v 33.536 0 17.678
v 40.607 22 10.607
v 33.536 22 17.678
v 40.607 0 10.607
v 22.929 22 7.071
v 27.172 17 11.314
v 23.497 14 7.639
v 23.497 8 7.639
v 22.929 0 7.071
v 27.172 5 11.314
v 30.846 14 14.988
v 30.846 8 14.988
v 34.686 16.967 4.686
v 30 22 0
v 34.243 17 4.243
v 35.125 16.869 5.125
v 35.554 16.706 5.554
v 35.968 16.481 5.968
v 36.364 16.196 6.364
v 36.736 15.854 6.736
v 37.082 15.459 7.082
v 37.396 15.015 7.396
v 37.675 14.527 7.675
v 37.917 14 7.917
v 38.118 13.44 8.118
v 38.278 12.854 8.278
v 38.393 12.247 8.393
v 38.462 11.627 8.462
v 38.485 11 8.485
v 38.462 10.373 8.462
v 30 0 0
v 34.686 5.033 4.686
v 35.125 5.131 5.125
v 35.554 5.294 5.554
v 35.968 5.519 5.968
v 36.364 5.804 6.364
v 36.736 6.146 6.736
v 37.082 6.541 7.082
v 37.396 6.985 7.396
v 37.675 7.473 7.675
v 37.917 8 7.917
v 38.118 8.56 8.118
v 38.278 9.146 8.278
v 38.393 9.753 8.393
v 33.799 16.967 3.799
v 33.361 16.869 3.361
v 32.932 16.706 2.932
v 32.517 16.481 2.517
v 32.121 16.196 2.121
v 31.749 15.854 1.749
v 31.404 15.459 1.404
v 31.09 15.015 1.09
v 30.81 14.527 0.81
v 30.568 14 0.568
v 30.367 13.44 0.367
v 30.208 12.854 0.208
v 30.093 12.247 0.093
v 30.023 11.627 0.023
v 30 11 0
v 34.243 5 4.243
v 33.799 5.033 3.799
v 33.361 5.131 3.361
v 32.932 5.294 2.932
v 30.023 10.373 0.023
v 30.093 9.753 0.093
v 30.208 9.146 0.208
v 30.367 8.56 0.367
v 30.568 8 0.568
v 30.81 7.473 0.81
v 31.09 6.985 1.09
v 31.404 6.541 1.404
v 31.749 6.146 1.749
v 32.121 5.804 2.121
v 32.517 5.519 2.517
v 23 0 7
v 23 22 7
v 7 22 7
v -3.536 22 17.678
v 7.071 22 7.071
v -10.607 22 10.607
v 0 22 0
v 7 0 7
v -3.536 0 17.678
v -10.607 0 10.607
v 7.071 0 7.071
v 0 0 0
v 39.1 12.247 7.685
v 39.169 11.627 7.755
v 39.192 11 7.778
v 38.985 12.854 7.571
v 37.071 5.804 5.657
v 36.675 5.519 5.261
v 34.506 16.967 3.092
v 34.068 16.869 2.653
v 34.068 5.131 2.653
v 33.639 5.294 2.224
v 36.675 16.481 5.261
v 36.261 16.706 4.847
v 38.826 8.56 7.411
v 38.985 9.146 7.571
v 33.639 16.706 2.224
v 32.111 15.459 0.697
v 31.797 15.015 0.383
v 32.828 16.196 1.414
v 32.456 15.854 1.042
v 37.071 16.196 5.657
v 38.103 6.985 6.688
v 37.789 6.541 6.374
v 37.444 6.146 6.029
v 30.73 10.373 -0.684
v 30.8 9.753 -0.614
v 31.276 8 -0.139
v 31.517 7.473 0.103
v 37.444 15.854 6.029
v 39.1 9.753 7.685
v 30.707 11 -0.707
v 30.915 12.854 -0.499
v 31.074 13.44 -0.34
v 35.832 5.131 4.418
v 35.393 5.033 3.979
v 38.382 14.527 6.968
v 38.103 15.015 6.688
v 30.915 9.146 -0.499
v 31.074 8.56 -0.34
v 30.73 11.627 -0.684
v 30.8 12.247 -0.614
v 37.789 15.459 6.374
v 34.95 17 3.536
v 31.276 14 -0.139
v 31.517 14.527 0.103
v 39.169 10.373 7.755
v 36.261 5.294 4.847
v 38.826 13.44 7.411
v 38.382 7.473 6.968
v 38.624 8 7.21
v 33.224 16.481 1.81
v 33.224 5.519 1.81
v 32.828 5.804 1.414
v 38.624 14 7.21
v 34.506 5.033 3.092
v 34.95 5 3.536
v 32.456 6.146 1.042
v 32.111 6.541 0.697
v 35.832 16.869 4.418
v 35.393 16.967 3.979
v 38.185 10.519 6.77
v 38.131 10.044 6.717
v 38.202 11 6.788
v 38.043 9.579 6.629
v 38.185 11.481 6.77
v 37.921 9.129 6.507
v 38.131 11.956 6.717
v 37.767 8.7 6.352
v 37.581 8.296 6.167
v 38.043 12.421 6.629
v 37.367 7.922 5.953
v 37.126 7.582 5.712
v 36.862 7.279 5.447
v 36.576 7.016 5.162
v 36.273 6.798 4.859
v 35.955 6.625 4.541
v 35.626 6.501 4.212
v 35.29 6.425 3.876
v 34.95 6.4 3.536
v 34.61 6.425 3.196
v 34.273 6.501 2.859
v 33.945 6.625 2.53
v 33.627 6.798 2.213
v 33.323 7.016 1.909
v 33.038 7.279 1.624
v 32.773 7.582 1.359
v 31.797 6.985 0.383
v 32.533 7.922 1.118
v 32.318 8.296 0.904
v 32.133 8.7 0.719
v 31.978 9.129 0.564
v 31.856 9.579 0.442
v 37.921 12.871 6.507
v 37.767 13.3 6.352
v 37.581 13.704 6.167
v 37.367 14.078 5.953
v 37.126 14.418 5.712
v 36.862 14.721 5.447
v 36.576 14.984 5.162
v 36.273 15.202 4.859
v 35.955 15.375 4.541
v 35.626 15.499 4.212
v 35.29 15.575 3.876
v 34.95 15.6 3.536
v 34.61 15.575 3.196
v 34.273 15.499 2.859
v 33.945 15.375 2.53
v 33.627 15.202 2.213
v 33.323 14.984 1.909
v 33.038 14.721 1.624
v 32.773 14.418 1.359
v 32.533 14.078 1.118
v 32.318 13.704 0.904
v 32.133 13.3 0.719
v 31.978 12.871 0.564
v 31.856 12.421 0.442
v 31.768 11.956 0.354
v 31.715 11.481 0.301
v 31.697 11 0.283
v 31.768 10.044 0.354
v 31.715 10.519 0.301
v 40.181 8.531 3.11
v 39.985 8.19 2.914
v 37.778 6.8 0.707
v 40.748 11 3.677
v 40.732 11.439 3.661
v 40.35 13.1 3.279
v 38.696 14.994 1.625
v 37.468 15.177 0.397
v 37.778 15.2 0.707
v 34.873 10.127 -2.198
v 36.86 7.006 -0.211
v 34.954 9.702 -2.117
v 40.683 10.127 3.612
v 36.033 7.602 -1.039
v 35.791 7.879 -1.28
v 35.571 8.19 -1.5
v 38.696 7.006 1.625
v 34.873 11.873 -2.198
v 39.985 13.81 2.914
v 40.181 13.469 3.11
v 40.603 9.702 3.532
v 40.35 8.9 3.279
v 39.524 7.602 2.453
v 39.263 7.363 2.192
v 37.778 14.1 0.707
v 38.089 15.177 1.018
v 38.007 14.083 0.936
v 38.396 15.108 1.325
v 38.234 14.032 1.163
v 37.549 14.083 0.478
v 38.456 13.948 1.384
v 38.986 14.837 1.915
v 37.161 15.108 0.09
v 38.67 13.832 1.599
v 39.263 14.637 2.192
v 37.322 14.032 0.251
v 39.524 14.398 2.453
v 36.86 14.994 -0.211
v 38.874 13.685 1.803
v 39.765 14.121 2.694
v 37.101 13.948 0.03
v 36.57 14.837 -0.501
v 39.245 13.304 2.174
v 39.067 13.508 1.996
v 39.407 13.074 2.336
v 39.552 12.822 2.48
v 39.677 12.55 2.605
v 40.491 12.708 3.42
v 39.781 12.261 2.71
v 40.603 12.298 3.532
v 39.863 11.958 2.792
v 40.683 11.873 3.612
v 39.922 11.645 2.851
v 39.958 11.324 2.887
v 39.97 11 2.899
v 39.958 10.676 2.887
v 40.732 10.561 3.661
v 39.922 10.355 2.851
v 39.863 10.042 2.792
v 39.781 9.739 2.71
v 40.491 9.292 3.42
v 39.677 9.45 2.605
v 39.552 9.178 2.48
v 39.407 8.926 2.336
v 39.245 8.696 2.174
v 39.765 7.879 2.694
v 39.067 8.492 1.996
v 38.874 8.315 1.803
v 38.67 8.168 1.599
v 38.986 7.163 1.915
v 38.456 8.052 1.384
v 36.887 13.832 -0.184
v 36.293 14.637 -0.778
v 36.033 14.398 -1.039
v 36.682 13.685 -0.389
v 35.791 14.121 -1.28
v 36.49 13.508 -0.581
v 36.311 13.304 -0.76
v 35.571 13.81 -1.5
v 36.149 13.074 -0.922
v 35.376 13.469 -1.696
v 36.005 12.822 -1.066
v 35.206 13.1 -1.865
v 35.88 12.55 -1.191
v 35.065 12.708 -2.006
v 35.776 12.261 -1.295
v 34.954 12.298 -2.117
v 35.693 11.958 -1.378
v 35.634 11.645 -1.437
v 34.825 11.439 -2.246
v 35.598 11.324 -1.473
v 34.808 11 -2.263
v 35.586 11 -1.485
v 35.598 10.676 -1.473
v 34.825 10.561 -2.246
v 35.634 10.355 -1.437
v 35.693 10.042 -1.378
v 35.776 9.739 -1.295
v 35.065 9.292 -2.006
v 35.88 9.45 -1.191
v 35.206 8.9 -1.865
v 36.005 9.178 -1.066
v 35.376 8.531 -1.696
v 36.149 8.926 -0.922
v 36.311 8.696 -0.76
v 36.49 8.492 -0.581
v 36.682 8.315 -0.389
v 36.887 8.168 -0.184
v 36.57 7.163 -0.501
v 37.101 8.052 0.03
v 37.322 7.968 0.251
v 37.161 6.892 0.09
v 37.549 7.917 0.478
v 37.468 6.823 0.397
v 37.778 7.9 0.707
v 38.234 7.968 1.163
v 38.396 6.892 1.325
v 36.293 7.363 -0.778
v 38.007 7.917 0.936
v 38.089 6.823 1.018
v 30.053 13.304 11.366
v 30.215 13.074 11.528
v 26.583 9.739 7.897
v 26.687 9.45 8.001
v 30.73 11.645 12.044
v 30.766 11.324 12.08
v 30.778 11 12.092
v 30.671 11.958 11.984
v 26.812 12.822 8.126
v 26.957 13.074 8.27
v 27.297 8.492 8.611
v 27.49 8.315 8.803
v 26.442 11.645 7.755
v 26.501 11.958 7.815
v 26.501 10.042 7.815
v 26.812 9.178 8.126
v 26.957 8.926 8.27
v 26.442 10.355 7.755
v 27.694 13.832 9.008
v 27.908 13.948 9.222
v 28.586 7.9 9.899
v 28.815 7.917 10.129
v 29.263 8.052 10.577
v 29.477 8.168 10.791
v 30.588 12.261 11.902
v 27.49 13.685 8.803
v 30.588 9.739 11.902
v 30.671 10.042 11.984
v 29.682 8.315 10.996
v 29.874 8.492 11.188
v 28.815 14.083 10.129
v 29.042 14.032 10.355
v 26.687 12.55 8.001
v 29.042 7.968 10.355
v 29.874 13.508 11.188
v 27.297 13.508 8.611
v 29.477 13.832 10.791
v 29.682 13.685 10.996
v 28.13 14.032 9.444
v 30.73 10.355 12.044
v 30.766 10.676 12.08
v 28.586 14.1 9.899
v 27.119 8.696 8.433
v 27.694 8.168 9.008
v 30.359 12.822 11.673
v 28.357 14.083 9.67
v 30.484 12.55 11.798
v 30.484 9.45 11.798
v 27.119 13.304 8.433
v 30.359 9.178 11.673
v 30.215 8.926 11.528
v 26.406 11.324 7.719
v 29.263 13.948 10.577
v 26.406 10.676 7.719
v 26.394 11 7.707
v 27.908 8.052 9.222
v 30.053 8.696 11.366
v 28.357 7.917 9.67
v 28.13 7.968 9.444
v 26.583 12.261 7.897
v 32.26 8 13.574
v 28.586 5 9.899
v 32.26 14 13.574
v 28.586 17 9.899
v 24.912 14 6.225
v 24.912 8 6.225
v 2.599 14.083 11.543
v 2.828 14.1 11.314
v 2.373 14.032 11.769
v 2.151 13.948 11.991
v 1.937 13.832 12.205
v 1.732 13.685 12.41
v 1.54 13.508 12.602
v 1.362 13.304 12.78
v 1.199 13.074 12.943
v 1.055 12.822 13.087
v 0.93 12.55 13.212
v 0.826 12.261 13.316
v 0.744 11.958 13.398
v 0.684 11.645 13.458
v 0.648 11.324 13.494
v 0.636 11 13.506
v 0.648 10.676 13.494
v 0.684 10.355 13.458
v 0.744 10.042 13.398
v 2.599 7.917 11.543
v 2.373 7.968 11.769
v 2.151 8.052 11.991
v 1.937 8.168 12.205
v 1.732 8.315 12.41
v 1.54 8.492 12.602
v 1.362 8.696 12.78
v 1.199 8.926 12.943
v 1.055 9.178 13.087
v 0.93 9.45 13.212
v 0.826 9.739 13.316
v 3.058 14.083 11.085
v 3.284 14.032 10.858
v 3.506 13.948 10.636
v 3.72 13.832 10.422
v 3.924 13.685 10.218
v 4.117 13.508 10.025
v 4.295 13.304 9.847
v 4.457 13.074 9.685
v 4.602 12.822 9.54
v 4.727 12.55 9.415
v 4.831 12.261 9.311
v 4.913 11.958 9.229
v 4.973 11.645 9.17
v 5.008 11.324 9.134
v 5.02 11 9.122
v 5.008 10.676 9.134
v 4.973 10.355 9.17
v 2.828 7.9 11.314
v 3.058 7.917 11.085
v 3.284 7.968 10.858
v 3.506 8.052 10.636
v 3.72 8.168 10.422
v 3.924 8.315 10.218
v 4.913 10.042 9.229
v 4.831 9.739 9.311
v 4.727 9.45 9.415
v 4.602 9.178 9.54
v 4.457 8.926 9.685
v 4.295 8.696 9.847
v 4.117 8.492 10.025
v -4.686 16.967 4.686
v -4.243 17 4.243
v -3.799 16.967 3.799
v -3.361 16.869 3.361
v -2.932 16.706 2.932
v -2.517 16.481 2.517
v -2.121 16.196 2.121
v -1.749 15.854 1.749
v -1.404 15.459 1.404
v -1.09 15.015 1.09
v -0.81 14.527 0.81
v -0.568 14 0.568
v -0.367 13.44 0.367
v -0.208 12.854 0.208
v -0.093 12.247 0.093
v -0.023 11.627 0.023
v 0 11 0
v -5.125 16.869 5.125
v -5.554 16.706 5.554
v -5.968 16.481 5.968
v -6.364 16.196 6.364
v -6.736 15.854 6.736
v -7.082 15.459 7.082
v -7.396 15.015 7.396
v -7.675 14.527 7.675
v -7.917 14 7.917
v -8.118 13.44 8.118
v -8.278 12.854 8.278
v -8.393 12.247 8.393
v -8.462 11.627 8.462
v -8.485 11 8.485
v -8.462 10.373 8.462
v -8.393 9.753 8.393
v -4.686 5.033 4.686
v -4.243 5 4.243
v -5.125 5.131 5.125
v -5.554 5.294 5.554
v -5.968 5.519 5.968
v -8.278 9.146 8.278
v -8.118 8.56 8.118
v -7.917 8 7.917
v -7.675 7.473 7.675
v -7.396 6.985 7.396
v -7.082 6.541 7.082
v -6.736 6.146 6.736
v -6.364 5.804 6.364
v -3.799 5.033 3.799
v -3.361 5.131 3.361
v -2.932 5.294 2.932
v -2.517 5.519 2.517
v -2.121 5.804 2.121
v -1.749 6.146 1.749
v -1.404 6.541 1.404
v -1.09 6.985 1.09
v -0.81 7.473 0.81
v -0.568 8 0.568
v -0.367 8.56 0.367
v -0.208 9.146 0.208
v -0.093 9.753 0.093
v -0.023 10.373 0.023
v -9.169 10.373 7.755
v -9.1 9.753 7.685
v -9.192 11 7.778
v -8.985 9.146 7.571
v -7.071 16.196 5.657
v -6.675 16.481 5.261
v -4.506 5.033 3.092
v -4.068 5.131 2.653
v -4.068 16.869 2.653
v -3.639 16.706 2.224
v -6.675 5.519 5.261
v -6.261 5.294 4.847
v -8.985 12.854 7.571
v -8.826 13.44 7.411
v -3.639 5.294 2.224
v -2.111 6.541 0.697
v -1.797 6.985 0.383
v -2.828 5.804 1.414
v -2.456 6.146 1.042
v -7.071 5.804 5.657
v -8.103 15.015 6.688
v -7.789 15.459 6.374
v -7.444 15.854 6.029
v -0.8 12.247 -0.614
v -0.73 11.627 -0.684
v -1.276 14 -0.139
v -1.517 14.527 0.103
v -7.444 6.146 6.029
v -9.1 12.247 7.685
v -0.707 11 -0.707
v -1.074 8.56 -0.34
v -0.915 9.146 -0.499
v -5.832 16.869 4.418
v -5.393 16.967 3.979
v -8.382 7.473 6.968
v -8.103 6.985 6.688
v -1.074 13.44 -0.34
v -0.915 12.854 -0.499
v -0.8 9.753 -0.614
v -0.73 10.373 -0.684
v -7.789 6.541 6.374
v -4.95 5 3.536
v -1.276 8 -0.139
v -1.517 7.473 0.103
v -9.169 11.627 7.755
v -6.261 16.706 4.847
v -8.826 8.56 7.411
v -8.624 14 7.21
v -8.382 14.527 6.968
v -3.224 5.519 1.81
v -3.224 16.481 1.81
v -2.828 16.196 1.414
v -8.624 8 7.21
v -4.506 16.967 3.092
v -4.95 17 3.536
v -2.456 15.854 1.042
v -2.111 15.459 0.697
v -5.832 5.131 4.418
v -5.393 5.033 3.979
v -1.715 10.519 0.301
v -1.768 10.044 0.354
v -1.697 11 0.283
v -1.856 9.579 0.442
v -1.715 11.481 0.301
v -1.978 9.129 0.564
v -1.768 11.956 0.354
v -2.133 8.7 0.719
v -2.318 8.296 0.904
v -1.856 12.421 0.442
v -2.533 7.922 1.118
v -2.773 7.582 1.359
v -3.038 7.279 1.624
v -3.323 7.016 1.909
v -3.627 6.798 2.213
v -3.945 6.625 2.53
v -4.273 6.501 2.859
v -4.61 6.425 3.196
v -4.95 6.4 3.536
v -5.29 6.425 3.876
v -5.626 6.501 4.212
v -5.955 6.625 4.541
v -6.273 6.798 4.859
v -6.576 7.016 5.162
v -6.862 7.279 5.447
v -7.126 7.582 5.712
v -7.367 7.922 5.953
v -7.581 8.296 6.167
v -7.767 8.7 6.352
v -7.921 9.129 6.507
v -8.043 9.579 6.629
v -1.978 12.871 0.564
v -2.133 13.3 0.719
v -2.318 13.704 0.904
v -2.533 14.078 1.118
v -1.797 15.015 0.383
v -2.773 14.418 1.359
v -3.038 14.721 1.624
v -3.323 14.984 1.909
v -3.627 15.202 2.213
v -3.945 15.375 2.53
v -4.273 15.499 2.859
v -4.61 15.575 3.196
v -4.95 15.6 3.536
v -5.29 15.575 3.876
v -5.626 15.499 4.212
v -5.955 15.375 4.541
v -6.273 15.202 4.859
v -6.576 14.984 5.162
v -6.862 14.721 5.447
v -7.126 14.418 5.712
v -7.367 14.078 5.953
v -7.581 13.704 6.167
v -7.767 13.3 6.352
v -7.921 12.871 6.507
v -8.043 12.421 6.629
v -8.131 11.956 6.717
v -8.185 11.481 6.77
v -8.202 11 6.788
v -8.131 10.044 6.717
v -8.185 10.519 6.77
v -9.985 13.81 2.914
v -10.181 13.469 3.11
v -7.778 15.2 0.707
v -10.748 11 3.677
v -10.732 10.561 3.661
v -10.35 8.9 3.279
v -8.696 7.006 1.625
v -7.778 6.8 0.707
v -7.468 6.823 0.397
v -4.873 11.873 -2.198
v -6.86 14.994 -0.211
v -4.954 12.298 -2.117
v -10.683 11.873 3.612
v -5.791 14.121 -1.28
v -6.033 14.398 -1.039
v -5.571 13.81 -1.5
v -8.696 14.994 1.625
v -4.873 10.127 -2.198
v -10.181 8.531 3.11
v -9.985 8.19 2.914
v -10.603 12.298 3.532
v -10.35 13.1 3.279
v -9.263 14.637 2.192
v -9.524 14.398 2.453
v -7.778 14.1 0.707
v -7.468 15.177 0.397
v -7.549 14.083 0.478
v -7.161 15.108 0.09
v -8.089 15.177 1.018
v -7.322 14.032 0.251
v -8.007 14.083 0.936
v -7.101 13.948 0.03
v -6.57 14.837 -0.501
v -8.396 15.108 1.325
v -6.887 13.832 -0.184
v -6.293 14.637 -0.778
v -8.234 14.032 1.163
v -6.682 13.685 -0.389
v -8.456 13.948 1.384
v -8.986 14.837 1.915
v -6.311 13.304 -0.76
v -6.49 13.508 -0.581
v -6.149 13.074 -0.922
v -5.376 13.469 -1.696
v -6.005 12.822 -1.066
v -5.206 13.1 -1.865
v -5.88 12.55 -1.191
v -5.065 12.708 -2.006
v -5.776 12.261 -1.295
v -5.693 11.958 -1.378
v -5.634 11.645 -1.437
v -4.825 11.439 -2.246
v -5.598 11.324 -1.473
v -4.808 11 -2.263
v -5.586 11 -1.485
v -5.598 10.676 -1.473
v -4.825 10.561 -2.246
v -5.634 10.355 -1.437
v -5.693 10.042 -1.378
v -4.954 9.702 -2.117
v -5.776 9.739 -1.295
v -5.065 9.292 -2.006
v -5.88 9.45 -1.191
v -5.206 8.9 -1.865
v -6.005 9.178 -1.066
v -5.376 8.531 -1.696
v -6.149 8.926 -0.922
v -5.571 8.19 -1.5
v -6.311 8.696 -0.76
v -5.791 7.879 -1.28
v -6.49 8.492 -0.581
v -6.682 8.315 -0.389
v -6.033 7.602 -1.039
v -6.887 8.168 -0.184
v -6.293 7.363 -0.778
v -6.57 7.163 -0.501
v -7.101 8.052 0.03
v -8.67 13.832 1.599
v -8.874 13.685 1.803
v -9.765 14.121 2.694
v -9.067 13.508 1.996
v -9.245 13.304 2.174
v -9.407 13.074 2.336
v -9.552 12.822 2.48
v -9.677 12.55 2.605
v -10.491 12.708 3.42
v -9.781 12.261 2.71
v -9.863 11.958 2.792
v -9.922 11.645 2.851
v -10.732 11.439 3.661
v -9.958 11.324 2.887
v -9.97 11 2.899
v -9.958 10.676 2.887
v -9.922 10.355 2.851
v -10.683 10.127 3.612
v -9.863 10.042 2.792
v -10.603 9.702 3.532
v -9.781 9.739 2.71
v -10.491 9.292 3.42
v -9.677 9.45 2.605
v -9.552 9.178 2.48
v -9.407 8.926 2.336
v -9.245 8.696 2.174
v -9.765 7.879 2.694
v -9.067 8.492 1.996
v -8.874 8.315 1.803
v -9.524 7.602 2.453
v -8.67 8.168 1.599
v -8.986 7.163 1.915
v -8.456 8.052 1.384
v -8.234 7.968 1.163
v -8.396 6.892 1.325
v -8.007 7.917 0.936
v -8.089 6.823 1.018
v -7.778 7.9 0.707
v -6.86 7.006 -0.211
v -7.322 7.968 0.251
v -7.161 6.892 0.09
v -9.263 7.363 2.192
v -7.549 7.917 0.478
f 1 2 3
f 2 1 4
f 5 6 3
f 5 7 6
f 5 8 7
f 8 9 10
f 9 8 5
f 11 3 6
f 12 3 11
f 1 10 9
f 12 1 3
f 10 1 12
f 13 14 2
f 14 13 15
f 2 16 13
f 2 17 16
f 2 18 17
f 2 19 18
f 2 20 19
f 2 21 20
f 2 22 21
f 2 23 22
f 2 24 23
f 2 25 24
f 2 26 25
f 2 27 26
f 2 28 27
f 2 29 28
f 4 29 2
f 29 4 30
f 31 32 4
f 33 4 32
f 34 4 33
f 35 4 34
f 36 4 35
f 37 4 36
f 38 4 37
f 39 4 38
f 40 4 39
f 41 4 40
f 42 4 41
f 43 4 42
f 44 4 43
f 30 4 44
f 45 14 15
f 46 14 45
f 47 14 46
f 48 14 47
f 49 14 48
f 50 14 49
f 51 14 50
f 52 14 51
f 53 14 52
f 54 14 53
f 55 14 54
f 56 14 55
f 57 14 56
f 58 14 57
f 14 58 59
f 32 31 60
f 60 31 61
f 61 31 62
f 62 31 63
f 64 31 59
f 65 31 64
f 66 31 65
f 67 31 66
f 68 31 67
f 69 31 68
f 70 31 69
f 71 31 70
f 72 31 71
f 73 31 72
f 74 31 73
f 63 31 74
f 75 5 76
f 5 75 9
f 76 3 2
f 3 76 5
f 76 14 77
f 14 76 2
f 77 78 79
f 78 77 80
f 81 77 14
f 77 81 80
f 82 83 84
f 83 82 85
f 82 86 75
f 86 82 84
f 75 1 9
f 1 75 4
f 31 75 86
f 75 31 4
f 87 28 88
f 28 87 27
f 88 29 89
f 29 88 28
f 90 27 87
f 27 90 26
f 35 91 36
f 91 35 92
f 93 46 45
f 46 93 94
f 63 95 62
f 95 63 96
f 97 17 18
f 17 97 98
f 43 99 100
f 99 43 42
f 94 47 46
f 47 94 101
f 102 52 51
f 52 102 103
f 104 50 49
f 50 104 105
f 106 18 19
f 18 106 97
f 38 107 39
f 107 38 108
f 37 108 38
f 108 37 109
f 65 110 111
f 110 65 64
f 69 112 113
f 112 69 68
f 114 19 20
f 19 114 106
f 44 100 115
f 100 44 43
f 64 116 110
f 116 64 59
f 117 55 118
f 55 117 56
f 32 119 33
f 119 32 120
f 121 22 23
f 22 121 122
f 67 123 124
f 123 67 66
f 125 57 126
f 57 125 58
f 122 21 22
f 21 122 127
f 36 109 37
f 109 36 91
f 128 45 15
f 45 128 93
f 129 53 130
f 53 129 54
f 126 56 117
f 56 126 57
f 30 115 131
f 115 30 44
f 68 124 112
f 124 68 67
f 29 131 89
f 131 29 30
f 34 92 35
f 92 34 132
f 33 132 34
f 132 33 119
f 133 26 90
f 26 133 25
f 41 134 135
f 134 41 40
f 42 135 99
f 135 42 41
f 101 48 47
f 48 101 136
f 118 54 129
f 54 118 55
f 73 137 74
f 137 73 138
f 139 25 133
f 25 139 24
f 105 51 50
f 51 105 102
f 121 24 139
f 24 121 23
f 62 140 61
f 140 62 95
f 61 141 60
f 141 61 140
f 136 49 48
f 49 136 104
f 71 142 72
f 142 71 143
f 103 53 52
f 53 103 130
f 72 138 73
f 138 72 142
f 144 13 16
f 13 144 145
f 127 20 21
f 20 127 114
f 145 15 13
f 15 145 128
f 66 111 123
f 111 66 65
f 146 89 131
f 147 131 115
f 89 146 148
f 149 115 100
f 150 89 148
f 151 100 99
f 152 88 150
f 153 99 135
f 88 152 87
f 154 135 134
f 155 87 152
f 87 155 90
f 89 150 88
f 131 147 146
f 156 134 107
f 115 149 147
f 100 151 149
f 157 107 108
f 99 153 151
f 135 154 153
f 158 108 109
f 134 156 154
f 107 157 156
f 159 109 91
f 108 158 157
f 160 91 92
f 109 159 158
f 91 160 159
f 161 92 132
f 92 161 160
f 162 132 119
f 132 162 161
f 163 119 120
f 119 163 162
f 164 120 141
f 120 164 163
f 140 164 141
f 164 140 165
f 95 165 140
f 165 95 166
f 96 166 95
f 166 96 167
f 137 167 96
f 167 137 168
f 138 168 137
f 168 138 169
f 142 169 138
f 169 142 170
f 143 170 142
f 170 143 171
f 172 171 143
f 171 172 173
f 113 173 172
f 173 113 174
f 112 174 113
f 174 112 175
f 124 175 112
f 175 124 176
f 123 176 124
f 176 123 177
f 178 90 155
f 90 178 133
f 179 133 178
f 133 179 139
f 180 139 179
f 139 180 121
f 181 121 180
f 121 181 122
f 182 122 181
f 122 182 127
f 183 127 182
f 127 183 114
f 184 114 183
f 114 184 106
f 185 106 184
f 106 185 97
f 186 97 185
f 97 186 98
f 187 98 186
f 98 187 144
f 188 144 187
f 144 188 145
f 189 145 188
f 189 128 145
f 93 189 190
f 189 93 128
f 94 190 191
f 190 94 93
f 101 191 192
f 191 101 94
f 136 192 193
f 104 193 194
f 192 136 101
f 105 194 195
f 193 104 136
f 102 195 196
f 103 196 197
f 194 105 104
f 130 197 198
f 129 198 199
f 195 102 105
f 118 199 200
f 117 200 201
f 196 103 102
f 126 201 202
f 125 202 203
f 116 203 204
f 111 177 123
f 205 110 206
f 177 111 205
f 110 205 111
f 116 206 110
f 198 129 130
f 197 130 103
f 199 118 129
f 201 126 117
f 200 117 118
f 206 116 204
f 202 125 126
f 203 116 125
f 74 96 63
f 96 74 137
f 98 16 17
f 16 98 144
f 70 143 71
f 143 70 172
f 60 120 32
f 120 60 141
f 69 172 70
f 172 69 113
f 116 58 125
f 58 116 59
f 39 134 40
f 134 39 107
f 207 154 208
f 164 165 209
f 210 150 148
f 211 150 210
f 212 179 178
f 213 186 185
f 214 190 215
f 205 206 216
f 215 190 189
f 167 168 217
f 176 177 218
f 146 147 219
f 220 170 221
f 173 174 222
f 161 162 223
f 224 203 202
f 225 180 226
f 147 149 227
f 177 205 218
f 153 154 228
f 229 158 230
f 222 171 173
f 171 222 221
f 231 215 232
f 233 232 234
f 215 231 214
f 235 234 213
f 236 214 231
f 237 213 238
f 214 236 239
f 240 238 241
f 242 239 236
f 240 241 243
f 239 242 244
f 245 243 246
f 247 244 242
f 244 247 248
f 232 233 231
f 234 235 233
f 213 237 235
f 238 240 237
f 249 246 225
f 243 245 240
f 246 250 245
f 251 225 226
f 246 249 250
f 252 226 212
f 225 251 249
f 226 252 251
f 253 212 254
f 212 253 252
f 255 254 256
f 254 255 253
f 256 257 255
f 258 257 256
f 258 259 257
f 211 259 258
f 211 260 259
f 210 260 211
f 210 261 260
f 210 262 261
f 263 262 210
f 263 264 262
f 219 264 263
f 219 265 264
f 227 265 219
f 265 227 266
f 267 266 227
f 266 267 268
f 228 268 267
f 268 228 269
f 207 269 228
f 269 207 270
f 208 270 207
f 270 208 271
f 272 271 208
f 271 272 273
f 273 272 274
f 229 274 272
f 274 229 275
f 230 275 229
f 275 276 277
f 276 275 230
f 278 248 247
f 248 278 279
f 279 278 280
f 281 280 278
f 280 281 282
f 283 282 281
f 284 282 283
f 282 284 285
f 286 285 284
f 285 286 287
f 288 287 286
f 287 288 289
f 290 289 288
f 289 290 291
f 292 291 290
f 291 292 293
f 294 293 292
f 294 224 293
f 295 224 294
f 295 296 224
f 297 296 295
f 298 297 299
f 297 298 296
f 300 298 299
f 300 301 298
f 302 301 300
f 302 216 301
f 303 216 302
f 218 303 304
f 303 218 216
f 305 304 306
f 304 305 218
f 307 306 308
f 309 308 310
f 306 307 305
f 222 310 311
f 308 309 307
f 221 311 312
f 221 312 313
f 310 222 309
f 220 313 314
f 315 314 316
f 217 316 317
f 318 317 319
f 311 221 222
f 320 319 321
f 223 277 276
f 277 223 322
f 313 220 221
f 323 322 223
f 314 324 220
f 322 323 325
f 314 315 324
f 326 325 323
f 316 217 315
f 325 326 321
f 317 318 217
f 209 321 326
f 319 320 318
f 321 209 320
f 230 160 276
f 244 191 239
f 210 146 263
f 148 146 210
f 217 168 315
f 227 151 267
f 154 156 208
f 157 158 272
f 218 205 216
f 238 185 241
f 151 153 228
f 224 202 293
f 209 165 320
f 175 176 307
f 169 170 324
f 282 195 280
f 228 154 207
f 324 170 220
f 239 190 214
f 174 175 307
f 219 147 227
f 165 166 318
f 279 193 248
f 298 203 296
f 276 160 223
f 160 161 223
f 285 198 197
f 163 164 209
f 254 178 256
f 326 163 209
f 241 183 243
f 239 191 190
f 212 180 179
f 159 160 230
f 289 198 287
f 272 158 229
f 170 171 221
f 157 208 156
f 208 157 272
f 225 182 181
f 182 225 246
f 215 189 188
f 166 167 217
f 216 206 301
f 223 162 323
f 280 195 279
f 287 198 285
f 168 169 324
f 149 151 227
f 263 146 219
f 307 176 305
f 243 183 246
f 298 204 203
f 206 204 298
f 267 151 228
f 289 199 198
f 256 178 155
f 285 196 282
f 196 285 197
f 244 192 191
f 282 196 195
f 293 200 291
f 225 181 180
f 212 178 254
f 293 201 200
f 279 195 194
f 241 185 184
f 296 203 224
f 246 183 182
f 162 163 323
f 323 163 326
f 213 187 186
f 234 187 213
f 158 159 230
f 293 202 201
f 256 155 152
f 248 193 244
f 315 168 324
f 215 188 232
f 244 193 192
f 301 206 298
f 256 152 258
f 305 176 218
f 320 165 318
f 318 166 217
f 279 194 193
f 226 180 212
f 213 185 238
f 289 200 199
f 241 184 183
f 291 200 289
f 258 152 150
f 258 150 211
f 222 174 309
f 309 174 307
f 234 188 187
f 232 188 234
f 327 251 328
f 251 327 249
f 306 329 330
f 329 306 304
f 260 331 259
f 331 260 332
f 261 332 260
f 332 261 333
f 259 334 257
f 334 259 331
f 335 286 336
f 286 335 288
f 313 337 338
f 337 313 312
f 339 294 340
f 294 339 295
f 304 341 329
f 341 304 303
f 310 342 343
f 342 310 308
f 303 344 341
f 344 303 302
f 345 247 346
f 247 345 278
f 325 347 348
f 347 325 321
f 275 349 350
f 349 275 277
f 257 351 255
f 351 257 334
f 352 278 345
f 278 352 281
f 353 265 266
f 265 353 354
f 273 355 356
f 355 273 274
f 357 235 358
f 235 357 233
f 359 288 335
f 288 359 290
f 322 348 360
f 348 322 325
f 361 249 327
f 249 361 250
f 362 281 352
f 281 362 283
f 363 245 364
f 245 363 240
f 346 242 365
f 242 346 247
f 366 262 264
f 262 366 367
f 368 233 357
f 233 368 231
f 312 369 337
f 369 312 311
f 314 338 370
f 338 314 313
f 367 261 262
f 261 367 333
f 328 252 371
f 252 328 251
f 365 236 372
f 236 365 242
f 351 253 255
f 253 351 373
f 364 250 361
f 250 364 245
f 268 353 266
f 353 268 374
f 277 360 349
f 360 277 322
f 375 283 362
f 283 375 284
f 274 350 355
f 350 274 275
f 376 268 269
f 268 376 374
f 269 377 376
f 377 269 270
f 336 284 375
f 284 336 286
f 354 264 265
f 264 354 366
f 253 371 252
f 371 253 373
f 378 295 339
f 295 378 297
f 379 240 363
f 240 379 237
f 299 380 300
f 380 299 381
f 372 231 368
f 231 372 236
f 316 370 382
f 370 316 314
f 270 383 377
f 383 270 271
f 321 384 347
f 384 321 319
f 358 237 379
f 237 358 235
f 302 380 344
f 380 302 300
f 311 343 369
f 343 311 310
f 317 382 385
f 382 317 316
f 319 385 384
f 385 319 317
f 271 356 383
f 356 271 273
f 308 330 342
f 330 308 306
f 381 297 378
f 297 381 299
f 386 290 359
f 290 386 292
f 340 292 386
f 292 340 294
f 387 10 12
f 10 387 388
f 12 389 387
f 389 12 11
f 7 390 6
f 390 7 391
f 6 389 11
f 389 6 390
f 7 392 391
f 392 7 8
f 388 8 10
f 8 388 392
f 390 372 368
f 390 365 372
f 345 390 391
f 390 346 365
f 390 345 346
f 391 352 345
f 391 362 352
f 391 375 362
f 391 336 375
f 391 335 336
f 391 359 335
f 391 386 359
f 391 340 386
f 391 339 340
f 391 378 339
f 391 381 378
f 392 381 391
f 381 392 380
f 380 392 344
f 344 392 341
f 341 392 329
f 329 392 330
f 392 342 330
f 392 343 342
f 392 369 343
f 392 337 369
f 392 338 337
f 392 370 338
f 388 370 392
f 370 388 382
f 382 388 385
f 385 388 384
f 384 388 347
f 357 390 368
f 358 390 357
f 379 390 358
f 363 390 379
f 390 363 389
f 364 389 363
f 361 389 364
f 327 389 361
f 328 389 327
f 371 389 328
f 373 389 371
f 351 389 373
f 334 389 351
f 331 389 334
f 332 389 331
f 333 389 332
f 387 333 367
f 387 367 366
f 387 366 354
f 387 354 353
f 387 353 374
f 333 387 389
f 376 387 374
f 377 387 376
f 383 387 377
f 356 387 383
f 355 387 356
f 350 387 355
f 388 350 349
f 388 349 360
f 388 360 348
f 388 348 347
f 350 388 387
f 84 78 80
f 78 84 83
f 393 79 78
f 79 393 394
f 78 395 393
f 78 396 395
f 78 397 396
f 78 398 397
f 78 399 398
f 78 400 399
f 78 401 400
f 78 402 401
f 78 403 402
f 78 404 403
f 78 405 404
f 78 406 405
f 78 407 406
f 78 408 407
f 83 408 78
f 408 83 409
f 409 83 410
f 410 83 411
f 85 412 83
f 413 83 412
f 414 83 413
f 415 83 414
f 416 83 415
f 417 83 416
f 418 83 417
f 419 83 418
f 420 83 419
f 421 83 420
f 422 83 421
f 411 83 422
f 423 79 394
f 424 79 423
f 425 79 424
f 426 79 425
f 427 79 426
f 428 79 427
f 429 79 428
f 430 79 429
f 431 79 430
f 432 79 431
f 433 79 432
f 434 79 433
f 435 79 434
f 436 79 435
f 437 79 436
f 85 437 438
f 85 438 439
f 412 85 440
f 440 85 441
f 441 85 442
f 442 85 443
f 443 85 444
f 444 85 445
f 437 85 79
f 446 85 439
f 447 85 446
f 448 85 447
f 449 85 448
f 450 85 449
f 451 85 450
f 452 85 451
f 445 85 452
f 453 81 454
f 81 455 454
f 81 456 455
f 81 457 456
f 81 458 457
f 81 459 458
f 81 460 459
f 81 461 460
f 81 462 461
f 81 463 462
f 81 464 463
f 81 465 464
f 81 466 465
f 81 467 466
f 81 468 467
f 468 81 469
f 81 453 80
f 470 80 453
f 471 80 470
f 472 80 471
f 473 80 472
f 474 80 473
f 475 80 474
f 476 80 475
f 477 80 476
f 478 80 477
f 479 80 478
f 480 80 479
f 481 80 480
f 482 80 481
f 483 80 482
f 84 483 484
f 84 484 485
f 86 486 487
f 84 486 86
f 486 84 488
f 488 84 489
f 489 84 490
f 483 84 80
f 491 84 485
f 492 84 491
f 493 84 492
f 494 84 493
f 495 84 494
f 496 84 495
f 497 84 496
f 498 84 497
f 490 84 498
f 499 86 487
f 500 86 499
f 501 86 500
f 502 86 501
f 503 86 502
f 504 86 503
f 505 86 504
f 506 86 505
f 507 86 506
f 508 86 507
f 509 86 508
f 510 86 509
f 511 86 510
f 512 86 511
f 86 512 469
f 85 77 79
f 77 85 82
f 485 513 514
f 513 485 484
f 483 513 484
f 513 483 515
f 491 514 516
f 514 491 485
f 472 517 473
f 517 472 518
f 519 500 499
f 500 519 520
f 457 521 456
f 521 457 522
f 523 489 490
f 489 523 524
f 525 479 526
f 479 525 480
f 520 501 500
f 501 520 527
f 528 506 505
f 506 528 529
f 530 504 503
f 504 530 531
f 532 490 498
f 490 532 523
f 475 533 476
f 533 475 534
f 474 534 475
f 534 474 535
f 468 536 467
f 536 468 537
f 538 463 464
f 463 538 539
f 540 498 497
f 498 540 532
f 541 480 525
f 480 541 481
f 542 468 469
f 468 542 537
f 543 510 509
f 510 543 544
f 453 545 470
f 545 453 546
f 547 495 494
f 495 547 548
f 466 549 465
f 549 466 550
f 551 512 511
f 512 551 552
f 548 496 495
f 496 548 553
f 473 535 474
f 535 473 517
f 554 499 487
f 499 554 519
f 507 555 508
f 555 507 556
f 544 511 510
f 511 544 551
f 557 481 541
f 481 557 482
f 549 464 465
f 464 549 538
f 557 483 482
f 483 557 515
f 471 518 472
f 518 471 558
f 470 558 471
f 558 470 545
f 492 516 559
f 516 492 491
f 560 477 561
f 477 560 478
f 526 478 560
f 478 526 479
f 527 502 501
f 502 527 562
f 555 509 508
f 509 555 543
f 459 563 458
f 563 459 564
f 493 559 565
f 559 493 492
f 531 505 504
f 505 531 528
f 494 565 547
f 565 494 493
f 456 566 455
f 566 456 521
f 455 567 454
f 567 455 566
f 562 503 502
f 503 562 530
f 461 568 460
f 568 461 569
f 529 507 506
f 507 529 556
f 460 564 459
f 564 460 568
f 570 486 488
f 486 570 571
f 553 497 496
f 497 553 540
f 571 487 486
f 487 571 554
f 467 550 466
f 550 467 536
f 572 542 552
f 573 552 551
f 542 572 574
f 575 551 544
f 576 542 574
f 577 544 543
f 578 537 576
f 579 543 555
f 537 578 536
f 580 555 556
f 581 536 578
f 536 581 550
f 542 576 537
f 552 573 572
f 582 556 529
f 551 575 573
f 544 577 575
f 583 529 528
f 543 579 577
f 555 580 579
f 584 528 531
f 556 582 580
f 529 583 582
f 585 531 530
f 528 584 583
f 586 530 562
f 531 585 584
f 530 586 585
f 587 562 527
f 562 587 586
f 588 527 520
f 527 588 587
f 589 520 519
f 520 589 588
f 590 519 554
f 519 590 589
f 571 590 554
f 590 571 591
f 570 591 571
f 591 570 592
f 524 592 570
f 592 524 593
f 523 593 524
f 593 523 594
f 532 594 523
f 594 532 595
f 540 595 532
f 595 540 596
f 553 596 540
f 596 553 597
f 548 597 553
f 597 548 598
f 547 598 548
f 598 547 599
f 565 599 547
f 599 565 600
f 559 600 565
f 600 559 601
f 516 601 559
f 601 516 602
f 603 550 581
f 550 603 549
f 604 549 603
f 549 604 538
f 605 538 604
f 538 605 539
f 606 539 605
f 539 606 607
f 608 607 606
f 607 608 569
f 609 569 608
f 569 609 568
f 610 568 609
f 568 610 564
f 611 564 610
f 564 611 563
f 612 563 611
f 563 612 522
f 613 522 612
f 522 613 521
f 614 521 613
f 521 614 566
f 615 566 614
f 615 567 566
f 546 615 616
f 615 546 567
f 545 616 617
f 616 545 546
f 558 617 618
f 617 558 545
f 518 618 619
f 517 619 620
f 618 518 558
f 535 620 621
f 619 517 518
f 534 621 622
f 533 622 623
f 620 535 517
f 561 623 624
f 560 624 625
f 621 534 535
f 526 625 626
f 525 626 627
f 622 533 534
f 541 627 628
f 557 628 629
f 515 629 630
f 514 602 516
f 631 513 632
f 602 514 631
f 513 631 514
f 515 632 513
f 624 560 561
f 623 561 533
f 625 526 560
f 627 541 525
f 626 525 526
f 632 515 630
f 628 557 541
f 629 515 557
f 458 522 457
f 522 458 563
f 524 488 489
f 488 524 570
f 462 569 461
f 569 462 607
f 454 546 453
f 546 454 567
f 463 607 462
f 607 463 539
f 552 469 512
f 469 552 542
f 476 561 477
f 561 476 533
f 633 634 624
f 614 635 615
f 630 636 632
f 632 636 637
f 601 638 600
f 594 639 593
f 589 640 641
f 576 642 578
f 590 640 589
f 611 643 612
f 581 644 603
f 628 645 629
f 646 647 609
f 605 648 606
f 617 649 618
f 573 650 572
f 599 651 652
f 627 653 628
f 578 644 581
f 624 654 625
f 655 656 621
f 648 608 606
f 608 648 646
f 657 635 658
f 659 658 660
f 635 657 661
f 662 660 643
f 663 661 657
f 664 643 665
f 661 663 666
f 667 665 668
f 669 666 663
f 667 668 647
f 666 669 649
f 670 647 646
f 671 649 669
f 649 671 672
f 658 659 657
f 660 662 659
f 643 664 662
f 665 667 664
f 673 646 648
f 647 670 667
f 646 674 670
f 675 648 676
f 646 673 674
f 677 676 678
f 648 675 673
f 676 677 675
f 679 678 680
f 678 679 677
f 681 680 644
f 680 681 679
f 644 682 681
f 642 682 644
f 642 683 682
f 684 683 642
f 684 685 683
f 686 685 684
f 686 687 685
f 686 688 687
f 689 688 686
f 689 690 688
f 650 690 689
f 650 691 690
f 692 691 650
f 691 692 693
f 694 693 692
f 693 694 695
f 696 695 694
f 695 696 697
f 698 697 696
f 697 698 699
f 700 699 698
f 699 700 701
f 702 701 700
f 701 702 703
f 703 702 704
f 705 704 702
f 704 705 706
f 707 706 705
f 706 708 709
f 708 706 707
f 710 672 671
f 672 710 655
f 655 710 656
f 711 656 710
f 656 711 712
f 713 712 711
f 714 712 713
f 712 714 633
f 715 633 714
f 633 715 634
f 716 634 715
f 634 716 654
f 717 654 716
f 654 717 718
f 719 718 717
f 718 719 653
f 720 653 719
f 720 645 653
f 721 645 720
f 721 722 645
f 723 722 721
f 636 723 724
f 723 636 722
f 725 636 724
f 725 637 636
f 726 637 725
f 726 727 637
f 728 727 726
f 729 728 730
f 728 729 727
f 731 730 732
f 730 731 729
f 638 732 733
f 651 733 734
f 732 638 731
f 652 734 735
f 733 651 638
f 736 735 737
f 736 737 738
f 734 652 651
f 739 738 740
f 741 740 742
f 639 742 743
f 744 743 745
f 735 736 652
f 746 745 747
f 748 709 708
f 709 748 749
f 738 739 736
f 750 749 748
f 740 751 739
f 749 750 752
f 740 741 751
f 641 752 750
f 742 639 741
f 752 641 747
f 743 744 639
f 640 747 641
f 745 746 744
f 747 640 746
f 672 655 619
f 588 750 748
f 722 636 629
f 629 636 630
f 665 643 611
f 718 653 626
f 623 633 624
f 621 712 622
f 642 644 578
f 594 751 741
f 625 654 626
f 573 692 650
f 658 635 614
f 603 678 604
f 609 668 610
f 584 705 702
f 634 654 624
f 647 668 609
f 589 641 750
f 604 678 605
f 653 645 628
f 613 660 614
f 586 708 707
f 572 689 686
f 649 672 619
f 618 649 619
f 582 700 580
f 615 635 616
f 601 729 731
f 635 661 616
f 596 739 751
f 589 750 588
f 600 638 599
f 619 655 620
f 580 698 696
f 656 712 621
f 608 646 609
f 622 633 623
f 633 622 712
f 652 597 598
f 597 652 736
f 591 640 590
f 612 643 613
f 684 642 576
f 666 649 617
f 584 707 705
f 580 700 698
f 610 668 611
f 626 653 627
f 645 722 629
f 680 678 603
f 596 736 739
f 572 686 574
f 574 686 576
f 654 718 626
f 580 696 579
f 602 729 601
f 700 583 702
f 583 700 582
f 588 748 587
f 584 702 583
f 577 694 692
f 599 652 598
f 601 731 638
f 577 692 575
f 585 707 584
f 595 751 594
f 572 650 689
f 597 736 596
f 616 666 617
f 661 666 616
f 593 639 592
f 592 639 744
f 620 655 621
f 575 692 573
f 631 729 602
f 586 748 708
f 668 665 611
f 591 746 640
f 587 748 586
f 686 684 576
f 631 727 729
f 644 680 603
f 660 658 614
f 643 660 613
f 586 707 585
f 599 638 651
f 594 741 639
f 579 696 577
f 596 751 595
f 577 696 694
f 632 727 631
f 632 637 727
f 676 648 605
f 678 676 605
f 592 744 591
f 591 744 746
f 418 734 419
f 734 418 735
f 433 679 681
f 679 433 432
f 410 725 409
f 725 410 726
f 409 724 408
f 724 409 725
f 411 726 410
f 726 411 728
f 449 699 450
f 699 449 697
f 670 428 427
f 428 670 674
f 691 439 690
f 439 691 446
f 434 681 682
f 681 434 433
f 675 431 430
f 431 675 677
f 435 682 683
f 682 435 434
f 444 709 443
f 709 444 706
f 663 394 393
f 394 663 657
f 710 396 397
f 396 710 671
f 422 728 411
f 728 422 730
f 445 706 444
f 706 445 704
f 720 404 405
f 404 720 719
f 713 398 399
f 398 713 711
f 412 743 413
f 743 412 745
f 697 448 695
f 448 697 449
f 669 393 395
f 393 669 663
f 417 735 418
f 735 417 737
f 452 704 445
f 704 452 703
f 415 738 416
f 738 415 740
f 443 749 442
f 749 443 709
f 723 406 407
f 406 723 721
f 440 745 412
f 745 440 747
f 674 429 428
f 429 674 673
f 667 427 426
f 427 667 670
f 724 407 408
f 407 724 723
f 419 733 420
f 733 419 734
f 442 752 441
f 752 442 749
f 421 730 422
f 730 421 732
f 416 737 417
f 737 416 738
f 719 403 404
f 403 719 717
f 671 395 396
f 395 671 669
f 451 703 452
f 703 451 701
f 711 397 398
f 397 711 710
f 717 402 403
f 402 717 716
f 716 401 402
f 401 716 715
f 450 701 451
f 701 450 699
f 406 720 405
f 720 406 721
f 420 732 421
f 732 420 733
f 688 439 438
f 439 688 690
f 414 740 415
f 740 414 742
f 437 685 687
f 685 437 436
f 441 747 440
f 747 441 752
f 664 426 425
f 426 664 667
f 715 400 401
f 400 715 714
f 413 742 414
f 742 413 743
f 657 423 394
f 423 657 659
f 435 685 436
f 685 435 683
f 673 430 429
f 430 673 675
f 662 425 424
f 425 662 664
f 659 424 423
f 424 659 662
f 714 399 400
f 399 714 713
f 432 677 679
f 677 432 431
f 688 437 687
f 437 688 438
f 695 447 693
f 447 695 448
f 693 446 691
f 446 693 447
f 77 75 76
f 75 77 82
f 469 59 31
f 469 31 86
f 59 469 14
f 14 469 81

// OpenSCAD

//////////////DICHIARAZIONI///////////////////////

//flange width
L=30;
// Element width
Sp=22;
// Roundness
$fn=60; 

////////////////////


module angolare()
difference()
{
union()
{
cube([15,Sp,10]);
translate([6,Sp/2,-1])cylinder(2,6,6);
translate([6,Sp/2,-5])cylinder(4,4.2,4.6);

}
translate([6,Sp/2,-6])cylinder(17,3.1,3.1);
translate([6,Sp/2,8])rotate([0,0,30])cylinder(4,6,6,$fn=6);
}
module angolare1()
difference()
{
union()
{
cube([15,Sp,10]);
translate([6,Sp/2,-1])cylinder(2,6,6);
translate([6,Sp/2,-5])cylinder(4,4.2,4.6);

}
translate([6,Sp/2,-6])cylinder(17,3.1,3.1);
}

translate([L,0,0])rotate([0,-45,0])angolare();
translate([0,Sp,0])rotate([0,-45,180])angolare1();


hull()//corpo centrale
{
cube([L,Sp,1]);
translate([7,0,6])cube([L/2+1,Sp,1]);
}



























